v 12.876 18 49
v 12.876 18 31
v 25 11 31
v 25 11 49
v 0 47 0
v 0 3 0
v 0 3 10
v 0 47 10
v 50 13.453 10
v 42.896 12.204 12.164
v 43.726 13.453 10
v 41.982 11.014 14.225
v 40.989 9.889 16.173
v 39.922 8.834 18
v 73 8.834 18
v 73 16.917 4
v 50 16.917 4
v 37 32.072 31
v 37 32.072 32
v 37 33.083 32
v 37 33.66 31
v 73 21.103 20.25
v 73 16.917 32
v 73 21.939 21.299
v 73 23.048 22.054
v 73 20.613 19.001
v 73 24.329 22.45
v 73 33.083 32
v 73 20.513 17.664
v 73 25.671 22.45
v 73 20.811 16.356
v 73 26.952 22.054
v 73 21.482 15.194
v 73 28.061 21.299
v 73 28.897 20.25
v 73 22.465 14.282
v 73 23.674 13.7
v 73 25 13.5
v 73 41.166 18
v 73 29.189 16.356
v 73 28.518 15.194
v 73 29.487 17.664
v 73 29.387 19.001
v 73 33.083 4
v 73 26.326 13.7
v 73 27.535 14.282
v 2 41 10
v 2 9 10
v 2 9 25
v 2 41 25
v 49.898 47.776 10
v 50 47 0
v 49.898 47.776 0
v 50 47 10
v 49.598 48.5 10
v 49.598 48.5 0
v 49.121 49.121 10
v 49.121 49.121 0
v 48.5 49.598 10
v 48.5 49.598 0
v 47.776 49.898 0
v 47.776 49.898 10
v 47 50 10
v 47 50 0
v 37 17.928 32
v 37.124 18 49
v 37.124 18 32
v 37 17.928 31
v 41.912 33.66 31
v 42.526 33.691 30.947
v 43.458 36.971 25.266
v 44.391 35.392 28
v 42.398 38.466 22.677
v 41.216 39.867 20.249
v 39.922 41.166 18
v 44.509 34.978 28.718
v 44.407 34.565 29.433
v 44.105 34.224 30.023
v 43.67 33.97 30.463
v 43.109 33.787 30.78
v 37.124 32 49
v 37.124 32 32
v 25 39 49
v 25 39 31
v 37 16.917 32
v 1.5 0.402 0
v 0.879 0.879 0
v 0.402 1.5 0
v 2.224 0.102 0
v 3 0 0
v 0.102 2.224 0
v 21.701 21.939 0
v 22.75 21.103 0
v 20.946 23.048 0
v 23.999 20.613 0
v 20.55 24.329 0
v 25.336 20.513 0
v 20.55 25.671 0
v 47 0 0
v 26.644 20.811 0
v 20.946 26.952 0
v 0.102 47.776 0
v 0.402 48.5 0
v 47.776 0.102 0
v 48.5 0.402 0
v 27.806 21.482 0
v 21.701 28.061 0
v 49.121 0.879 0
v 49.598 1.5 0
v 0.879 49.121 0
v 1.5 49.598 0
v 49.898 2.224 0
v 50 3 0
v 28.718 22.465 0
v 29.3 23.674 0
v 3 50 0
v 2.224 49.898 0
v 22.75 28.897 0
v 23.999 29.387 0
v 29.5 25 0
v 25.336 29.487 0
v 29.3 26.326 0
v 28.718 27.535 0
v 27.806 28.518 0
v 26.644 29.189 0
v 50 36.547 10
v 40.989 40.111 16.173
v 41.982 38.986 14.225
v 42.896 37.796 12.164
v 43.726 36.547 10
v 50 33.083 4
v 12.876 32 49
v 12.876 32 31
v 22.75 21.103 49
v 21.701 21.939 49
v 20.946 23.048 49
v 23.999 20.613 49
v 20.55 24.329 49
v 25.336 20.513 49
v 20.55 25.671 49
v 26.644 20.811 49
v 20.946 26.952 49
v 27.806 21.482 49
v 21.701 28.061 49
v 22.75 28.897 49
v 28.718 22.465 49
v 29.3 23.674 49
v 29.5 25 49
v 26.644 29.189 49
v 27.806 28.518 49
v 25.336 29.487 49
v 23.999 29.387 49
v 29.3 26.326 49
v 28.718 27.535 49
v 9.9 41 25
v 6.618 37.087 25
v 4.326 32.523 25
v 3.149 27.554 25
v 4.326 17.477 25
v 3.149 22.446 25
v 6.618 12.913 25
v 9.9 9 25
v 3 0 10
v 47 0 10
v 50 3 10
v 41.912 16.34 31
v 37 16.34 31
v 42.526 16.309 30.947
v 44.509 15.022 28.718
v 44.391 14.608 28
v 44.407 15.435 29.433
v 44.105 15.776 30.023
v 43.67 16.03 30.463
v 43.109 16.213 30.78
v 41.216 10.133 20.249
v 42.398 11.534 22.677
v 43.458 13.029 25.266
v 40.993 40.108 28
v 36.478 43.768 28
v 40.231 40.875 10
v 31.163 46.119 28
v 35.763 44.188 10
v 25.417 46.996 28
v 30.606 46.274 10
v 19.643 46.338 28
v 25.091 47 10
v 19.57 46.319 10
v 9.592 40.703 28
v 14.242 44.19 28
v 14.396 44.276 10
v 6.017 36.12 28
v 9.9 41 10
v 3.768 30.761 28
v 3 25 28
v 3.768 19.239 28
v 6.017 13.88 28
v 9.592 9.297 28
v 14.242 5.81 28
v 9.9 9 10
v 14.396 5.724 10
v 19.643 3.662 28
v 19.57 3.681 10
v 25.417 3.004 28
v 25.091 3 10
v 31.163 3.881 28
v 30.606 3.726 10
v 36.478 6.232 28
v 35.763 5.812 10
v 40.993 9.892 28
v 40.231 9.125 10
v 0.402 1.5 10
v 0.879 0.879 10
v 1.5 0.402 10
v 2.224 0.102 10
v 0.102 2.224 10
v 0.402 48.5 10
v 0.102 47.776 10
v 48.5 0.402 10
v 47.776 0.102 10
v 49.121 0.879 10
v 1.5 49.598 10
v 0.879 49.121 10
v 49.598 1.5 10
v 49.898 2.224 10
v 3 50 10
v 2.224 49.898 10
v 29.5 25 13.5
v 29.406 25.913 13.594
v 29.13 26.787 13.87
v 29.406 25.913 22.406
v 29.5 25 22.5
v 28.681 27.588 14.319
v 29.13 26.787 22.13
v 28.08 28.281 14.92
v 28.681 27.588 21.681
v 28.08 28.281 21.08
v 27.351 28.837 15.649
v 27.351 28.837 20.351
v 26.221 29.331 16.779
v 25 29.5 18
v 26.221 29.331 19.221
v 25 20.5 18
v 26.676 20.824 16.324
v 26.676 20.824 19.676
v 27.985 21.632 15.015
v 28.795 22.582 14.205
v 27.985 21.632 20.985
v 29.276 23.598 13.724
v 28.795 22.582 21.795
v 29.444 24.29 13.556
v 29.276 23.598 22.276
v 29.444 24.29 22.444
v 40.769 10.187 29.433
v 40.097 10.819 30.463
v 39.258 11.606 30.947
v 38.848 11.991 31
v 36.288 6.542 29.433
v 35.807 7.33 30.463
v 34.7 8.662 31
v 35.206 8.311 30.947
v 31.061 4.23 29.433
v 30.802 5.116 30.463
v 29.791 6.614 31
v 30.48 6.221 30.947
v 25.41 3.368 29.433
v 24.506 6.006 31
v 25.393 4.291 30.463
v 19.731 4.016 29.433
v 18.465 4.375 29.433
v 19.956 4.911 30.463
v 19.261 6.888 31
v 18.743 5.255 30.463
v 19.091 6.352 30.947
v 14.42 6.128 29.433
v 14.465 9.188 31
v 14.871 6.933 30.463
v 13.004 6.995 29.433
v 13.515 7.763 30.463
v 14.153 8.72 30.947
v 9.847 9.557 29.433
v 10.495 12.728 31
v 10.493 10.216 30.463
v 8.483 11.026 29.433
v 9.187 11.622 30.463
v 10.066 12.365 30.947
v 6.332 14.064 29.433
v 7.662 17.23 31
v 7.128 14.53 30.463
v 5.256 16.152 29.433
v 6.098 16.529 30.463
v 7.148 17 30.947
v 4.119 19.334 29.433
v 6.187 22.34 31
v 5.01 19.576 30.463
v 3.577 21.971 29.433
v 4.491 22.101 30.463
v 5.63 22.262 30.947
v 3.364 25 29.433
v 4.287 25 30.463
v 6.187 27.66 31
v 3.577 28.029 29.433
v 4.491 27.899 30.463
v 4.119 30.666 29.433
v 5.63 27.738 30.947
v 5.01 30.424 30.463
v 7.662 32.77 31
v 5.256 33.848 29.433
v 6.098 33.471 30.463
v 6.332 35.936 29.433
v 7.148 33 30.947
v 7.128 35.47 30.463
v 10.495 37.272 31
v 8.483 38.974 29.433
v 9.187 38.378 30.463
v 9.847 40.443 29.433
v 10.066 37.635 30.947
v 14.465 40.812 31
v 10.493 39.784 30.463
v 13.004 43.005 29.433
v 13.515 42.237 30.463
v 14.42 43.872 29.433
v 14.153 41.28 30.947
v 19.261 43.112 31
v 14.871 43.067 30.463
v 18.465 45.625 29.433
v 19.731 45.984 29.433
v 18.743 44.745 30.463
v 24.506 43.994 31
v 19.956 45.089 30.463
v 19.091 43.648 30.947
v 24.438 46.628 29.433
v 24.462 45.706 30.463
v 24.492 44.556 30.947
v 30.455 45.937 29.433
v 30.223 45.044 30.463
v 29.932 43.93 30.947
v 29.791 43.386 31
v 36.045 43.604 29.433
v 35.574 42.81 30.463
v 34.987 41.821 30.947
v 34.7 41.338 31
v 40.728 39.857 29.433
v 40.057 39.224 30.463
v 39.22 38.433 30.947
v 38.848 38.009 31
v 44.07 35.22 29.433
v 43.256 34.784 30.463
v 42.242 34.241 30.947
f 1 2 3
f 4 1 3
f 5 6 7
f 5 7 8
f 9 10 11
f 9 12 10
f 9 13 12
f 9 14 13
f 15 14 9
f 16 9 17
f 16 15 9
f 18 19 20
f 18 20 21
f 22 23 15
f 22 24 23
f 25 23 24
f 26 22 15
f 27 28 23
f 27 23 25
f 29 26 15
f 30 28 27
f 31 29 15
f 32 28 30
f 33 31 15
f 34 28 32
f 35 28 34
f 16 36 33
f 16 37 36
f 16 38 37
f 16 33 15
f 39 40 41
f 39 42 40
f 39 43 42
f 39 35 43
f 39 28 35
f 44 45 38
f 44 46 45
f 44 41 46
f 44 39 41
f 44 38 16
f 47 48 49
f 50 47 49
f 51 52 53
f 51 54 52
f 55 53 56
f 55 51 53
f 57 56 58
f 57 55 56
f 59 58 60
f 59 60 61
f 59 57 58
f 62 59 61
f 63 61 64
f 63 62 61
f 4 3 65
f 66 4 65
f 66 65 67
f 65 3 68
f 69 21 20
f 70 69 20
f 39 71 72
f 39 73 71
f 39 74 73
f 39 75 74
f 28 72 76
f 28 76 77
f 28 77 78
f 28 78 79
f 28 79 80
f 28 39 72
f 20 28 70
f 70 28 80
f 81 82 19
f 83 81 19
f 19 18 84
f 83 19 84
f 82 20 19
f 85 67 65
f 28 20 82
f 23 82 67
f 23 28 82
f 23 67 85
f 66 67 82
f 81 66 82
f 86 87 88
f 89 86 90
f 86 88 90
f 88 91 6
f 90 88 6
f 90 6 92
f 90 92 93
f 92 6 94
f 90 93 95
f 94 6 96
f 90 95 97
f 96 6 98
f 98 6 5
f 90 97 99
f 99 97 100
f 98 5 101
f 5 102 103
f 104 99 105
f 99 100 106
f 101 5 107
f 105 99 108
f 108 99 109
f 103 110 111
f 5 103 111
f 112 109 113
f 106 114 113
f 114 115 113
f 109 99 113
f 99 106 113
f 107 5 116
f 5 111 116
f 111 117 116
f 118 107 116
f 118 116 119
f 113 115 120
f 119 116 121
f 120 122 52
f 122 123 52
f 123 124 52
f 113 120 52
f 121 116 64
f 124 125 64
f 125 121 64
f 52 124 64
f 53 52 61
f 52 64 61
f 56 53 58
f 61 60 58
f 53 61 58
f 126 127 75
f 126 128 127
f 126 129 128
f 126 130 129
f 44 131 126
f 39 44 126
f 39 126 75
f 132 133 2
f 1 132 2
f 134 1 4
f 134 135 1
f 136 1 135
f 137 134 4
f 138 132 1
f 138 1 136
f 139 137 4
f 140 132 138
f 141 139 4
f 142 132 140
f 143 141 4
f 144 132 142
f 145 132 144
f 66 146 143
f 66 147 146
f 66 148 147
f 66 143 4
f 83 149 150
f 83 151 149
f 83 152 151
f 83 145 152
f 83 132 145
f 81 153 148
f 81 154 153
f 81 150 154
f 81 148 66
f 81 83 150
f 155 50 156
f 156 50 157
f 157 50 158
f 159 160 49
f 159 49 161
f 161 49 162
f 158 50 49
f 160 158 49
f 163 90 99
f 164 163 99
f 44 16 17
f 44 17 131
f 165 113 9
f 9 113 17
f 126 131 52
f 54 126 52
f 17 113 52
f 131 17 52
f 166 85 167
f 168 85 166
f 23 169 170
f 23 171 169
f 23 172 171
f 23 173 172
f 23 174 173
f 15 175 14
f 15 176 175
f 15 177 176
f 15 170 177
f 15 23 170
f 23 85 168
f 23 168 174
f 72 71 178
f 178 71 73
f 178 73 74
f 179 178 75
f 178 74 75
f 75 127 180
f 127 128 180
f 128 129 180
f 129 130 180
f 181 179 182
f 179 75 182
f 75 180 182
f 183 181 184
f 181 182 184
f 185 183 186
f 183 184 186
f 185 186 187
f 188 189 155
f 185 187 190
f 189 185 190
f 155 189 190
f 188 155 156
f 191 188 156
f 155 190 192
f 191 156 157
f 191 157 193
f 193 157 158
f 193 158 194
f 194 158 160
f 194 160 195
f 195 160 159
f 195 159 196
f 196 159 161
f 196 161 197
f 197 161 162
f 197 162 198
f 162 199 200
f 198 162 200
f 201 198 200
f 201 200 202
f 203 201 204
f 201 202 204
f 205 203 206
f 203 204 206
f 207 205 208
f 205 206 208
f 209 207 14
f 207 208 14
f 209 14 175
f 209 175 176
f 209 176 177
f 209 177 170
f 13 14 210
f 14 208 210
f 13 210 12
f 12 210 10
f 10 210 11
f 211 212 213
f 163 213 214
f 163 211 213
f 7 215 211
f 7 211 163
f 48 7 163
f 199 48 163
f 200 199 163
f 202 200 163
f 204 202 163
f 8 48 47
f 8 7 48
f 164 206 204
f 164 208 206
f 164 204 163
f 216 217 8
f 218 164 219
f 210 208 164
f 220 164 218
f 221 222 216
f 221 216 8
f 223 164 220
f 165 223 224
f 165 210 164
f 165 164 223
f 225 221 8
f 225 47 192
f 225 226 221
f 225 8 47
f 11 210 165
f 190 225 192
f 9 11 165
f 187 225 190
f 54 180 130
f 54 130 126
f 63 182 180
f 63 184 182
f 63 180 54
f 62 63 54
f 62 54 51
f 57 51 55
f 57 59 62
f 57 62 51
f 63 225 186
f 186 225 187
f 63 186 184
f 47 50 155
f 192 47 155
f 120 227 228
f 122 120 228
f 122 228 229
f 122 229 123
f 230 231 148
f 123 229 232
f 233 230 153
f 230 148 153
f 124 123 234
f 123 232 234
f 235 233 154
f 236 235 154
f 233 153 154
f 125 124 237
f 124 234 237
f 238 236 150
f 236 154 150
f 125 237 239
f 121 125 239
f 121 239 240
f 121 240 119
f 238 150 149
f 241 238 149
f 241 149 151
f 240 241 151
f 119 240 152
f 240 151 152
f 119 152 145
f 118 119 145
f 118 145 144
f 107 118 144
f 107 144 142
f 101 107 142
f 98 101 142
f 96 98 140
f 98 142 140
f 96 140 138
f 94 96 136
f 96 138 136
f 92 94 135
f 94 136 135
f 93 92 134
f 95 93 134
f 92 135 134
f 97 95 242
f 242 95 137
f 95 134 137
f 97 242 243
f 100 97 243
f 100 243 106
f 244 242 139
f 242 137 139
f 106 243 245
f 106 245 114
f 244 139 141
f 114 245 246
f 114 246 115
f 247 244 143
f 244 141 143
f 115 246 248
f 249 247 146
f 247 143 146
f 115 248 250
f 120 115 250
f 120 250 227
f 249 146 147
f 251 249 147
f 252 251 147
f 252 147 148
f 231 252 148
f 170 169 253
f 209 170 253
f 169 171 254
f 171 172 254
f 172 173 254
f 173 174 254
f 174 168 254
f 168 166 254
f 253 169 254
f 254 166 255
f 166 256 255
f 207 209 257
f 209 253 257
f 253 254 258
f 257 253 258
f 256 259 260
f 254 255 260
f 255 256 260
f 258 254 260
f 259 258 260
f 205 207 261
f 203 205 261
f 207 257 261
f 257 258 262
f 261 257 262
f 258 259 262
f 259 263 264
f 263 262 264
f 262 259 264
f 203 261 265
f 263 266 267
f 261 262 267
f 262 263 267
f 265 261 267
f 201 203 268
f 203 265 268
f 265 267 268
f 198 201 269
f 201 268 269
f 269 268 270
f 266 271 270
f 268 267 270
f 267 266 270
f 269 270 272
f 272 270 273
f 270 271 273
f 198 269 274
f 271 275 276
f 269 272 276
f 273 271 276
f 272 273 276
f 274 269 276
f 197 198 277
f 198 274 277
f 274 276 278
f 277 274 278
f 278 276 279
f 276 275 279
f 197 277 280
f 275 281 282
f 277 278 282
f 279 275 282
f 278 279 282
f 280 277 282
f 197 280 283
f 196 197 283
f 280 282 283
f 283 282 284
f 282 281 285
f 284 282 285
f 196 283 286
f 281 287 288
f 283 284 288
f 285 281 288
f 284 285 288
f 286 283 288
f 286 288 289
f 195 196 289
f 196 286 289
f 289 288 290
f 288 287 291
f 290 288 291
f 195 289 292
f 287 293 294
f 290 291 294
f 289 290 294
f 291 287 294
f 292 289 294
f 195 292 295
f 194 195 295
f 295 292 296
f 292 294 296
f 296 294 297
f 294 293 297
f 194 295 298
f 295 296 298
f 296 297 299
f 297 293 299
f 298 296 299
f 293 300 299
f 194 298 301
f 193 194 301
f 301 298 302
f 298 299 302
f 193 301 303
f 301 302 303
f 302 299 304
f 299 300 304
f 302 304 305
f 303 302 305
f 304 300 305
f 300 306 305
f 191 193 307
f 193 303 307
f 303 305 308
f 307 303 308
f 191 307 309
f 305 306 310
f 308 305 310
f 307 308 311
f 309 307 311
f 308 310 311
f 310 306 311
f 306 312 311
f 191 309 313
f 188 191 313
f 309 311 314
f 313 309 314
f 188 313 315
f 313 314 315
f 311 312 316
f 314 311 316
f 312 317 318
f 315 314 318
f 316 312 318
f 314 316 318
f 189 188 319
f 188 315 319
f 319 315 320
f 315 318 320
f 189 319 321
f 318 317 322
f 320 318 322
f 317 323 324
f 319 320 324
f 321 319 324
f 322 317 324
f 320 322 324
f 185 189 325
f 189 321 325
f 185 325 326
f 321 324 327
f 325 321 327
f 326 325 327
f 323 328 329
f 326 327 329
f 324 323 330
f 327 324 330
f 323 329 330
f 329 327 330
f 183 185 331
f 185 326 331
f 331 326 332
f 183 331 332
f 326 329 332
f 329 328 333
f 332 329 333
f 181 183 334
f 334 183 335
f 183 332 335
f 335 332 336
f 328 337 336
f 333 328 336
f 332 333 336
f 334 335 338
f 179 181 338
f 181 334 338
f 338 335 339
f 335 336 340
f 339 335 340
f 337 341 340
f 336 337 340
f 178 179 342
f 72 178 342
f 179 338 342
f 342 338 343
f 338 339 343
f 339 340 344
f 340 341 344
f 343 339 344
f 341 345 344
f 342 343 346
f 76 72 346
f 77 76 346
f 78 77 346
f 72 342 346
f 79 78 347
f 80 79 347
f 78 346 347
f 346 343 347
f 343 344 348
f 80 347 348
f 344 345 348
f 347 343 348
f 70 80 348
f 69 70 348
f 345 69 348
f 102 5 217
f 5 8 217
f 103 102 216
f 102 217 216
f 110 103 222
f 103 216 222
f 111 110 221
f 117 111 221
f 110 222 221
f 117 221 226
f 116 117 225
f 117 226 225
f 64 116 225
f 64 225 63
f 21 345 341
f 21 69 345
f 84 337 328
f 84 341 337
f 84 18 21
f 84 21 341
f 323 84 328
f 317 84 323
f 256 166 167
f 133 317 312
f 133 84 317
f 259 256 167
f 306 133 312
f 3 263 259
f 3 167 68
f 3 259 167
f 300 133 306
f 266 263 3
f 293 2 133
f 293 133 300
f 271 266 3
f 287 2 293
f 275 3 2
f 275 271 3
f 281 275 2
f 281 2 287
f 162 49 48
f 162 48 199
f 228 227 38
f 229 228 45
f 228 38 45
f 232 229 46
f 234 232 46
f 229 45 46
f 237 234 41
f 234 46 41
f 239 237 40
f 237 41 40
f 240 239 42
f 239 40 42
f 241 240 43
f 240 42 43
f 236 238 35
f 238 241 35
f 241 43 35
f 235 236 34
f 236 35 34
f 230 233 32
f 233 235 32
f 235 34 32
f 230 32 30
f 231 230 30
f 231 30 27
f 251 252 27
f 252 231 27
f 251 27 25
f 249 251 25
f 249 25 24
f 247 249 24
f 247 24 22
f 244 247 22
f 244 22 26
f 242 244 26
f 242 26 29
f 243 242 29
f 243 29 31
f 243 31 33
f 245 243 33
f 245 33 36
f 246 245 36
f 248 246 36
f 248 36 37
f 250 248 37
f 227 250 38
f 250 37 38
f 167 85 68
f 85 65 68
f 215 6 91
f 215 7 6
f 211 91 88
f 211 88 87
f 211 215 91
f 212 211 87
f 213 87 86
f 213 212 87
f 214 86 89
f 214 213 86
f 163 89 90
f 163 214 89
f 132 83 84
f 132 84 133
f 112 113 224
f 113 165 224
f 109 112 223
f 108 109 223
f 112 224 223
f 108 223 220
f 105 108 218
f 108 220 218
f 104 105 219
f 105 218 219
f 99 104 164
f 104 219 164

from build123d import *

# Parameters (mm, degrees)
SKETCH1_W           = 50
SKETCH1_H           = 50
BOSS_EXTRUDE1_DEPTH = 10
SKETCH2_R           = 22
BOSS_EXTRUDE2_DEPTH = 21
BOSS_EXTRUDE3_DEPTH = 18
SKETCH4_R           = 4.5
CUT_EXTRUDE1_DEPTH  = 87.029064856
BOSS_EXTRUDE4_START = -9
SKETCH6_W           = 8
SKETCH6_H           = 15
BOSS_EXTRUDE4_DEPTH = 32
BOSS_EXTRUDE5_DEPTH = 36
SKETCH12_R          = 4.5
CUT_EXTRUDE2_DEPTH  = 48
FILLET1_R           = 3
FILLET2_R           = 3


with BuildPart() as part:
    # Sketch1 → Boss-Extrude1 (new body)
    with BuildSketch(Plane.XY):
        with Locations((25, 25)):
            Rectangle(SKETCH1_W, SKETCH1_H)
    extrude(amount=BOSS_EXTRUDE1_DEPTH)

    # Sketch2 → Boss-Extrude2 (add)
    with BuildSketch(Plane.XY.offset(10)):
        with Locations(Location((25, 25, 0), (0, 0, 180))):
            Circle(SKETCH2_R)
    extrude(amount=BOSS_EXTRUDE2_DEPTH)

    # Sketch3 → Boss-Extrude3 (add)
    with BuildSketch(Plane.XY.offset(31)):
        Polygon((25, 11), (37.124355653, 18), (37.124355653, 32), (25, 39), (12.875644347, 32), (12.875644347, 18), align=None)
    extrude(amount=BOSS_EXTRUDE3_DEPTH)

    # Sketch4 → Cut-Extrude1 (cut, through all)
    with BuildSketch(Plane.XY.offset(49)):
        with Locations((25, 25)):
            Circle(SKETCH4_R)
    extrude(amount=-CUT_EXTRUDE1_DEPTH, mode=Mode.SUBTRACT)

    # Sketch6 → Boss-Extrude4 (add)
    with BuildSketch(Plane.XZ.offset(BOSS_EXTRUDE4_START)):
        with Locations((6, 17.5)):
            Rectangle(SKETCH6_W, SKETCH6_H)
    extrude(amount=-BOSS_EXTRUDE4_DEPTH)

    # Sketch10 → Boss-Extrude5 (add)
    with BuildSketch(Plane(origin=(73, 0, 0), x_dir=(0, 0, -1), z_dir=(1, 0, 0))):
        Polygon((-4, 16.917096231), (-4, 33.082903769), (-18, 41.165807537), (-32, 33.082903769), (-32, 16.917096231), (-18, 8.834192463), align=None)
    extrude(amount=-BOSS_EXTRUDE5_DEPTH)

    # Sketch12 → Cut-Extrude2 (cut)
    with BuildSketch(Plane(origin=(73, 0, 0), x_dir=(0, 0, -1), z_dir=(1, 0, 0))):
        with Locations((-18, 25)):
            Circle(SKETCH12_R)
    extrude(amount=-CUT_EXTRUDE2_DEPTH, mode=Mode.SUBTRACT)

    # Fillet1
    fillet1_edges = [part.edges().sort_by_distance(p)[0] for p in [
        (3, 25, 31),
    ]]
    fillet(fillet1_edges, radius=FILLET1_R)

    # Fillet2
    fillet2_edges = [part.edges().sort_by_distance(p)[0] for p in [
        (0, 50, 5),
        (50, 50, 5),
        (50, 0, 5),
        (0, 0, 5),
    ]]
    fillet(fillet2_edges, radius=FILLET2_R)


solid = part.part
